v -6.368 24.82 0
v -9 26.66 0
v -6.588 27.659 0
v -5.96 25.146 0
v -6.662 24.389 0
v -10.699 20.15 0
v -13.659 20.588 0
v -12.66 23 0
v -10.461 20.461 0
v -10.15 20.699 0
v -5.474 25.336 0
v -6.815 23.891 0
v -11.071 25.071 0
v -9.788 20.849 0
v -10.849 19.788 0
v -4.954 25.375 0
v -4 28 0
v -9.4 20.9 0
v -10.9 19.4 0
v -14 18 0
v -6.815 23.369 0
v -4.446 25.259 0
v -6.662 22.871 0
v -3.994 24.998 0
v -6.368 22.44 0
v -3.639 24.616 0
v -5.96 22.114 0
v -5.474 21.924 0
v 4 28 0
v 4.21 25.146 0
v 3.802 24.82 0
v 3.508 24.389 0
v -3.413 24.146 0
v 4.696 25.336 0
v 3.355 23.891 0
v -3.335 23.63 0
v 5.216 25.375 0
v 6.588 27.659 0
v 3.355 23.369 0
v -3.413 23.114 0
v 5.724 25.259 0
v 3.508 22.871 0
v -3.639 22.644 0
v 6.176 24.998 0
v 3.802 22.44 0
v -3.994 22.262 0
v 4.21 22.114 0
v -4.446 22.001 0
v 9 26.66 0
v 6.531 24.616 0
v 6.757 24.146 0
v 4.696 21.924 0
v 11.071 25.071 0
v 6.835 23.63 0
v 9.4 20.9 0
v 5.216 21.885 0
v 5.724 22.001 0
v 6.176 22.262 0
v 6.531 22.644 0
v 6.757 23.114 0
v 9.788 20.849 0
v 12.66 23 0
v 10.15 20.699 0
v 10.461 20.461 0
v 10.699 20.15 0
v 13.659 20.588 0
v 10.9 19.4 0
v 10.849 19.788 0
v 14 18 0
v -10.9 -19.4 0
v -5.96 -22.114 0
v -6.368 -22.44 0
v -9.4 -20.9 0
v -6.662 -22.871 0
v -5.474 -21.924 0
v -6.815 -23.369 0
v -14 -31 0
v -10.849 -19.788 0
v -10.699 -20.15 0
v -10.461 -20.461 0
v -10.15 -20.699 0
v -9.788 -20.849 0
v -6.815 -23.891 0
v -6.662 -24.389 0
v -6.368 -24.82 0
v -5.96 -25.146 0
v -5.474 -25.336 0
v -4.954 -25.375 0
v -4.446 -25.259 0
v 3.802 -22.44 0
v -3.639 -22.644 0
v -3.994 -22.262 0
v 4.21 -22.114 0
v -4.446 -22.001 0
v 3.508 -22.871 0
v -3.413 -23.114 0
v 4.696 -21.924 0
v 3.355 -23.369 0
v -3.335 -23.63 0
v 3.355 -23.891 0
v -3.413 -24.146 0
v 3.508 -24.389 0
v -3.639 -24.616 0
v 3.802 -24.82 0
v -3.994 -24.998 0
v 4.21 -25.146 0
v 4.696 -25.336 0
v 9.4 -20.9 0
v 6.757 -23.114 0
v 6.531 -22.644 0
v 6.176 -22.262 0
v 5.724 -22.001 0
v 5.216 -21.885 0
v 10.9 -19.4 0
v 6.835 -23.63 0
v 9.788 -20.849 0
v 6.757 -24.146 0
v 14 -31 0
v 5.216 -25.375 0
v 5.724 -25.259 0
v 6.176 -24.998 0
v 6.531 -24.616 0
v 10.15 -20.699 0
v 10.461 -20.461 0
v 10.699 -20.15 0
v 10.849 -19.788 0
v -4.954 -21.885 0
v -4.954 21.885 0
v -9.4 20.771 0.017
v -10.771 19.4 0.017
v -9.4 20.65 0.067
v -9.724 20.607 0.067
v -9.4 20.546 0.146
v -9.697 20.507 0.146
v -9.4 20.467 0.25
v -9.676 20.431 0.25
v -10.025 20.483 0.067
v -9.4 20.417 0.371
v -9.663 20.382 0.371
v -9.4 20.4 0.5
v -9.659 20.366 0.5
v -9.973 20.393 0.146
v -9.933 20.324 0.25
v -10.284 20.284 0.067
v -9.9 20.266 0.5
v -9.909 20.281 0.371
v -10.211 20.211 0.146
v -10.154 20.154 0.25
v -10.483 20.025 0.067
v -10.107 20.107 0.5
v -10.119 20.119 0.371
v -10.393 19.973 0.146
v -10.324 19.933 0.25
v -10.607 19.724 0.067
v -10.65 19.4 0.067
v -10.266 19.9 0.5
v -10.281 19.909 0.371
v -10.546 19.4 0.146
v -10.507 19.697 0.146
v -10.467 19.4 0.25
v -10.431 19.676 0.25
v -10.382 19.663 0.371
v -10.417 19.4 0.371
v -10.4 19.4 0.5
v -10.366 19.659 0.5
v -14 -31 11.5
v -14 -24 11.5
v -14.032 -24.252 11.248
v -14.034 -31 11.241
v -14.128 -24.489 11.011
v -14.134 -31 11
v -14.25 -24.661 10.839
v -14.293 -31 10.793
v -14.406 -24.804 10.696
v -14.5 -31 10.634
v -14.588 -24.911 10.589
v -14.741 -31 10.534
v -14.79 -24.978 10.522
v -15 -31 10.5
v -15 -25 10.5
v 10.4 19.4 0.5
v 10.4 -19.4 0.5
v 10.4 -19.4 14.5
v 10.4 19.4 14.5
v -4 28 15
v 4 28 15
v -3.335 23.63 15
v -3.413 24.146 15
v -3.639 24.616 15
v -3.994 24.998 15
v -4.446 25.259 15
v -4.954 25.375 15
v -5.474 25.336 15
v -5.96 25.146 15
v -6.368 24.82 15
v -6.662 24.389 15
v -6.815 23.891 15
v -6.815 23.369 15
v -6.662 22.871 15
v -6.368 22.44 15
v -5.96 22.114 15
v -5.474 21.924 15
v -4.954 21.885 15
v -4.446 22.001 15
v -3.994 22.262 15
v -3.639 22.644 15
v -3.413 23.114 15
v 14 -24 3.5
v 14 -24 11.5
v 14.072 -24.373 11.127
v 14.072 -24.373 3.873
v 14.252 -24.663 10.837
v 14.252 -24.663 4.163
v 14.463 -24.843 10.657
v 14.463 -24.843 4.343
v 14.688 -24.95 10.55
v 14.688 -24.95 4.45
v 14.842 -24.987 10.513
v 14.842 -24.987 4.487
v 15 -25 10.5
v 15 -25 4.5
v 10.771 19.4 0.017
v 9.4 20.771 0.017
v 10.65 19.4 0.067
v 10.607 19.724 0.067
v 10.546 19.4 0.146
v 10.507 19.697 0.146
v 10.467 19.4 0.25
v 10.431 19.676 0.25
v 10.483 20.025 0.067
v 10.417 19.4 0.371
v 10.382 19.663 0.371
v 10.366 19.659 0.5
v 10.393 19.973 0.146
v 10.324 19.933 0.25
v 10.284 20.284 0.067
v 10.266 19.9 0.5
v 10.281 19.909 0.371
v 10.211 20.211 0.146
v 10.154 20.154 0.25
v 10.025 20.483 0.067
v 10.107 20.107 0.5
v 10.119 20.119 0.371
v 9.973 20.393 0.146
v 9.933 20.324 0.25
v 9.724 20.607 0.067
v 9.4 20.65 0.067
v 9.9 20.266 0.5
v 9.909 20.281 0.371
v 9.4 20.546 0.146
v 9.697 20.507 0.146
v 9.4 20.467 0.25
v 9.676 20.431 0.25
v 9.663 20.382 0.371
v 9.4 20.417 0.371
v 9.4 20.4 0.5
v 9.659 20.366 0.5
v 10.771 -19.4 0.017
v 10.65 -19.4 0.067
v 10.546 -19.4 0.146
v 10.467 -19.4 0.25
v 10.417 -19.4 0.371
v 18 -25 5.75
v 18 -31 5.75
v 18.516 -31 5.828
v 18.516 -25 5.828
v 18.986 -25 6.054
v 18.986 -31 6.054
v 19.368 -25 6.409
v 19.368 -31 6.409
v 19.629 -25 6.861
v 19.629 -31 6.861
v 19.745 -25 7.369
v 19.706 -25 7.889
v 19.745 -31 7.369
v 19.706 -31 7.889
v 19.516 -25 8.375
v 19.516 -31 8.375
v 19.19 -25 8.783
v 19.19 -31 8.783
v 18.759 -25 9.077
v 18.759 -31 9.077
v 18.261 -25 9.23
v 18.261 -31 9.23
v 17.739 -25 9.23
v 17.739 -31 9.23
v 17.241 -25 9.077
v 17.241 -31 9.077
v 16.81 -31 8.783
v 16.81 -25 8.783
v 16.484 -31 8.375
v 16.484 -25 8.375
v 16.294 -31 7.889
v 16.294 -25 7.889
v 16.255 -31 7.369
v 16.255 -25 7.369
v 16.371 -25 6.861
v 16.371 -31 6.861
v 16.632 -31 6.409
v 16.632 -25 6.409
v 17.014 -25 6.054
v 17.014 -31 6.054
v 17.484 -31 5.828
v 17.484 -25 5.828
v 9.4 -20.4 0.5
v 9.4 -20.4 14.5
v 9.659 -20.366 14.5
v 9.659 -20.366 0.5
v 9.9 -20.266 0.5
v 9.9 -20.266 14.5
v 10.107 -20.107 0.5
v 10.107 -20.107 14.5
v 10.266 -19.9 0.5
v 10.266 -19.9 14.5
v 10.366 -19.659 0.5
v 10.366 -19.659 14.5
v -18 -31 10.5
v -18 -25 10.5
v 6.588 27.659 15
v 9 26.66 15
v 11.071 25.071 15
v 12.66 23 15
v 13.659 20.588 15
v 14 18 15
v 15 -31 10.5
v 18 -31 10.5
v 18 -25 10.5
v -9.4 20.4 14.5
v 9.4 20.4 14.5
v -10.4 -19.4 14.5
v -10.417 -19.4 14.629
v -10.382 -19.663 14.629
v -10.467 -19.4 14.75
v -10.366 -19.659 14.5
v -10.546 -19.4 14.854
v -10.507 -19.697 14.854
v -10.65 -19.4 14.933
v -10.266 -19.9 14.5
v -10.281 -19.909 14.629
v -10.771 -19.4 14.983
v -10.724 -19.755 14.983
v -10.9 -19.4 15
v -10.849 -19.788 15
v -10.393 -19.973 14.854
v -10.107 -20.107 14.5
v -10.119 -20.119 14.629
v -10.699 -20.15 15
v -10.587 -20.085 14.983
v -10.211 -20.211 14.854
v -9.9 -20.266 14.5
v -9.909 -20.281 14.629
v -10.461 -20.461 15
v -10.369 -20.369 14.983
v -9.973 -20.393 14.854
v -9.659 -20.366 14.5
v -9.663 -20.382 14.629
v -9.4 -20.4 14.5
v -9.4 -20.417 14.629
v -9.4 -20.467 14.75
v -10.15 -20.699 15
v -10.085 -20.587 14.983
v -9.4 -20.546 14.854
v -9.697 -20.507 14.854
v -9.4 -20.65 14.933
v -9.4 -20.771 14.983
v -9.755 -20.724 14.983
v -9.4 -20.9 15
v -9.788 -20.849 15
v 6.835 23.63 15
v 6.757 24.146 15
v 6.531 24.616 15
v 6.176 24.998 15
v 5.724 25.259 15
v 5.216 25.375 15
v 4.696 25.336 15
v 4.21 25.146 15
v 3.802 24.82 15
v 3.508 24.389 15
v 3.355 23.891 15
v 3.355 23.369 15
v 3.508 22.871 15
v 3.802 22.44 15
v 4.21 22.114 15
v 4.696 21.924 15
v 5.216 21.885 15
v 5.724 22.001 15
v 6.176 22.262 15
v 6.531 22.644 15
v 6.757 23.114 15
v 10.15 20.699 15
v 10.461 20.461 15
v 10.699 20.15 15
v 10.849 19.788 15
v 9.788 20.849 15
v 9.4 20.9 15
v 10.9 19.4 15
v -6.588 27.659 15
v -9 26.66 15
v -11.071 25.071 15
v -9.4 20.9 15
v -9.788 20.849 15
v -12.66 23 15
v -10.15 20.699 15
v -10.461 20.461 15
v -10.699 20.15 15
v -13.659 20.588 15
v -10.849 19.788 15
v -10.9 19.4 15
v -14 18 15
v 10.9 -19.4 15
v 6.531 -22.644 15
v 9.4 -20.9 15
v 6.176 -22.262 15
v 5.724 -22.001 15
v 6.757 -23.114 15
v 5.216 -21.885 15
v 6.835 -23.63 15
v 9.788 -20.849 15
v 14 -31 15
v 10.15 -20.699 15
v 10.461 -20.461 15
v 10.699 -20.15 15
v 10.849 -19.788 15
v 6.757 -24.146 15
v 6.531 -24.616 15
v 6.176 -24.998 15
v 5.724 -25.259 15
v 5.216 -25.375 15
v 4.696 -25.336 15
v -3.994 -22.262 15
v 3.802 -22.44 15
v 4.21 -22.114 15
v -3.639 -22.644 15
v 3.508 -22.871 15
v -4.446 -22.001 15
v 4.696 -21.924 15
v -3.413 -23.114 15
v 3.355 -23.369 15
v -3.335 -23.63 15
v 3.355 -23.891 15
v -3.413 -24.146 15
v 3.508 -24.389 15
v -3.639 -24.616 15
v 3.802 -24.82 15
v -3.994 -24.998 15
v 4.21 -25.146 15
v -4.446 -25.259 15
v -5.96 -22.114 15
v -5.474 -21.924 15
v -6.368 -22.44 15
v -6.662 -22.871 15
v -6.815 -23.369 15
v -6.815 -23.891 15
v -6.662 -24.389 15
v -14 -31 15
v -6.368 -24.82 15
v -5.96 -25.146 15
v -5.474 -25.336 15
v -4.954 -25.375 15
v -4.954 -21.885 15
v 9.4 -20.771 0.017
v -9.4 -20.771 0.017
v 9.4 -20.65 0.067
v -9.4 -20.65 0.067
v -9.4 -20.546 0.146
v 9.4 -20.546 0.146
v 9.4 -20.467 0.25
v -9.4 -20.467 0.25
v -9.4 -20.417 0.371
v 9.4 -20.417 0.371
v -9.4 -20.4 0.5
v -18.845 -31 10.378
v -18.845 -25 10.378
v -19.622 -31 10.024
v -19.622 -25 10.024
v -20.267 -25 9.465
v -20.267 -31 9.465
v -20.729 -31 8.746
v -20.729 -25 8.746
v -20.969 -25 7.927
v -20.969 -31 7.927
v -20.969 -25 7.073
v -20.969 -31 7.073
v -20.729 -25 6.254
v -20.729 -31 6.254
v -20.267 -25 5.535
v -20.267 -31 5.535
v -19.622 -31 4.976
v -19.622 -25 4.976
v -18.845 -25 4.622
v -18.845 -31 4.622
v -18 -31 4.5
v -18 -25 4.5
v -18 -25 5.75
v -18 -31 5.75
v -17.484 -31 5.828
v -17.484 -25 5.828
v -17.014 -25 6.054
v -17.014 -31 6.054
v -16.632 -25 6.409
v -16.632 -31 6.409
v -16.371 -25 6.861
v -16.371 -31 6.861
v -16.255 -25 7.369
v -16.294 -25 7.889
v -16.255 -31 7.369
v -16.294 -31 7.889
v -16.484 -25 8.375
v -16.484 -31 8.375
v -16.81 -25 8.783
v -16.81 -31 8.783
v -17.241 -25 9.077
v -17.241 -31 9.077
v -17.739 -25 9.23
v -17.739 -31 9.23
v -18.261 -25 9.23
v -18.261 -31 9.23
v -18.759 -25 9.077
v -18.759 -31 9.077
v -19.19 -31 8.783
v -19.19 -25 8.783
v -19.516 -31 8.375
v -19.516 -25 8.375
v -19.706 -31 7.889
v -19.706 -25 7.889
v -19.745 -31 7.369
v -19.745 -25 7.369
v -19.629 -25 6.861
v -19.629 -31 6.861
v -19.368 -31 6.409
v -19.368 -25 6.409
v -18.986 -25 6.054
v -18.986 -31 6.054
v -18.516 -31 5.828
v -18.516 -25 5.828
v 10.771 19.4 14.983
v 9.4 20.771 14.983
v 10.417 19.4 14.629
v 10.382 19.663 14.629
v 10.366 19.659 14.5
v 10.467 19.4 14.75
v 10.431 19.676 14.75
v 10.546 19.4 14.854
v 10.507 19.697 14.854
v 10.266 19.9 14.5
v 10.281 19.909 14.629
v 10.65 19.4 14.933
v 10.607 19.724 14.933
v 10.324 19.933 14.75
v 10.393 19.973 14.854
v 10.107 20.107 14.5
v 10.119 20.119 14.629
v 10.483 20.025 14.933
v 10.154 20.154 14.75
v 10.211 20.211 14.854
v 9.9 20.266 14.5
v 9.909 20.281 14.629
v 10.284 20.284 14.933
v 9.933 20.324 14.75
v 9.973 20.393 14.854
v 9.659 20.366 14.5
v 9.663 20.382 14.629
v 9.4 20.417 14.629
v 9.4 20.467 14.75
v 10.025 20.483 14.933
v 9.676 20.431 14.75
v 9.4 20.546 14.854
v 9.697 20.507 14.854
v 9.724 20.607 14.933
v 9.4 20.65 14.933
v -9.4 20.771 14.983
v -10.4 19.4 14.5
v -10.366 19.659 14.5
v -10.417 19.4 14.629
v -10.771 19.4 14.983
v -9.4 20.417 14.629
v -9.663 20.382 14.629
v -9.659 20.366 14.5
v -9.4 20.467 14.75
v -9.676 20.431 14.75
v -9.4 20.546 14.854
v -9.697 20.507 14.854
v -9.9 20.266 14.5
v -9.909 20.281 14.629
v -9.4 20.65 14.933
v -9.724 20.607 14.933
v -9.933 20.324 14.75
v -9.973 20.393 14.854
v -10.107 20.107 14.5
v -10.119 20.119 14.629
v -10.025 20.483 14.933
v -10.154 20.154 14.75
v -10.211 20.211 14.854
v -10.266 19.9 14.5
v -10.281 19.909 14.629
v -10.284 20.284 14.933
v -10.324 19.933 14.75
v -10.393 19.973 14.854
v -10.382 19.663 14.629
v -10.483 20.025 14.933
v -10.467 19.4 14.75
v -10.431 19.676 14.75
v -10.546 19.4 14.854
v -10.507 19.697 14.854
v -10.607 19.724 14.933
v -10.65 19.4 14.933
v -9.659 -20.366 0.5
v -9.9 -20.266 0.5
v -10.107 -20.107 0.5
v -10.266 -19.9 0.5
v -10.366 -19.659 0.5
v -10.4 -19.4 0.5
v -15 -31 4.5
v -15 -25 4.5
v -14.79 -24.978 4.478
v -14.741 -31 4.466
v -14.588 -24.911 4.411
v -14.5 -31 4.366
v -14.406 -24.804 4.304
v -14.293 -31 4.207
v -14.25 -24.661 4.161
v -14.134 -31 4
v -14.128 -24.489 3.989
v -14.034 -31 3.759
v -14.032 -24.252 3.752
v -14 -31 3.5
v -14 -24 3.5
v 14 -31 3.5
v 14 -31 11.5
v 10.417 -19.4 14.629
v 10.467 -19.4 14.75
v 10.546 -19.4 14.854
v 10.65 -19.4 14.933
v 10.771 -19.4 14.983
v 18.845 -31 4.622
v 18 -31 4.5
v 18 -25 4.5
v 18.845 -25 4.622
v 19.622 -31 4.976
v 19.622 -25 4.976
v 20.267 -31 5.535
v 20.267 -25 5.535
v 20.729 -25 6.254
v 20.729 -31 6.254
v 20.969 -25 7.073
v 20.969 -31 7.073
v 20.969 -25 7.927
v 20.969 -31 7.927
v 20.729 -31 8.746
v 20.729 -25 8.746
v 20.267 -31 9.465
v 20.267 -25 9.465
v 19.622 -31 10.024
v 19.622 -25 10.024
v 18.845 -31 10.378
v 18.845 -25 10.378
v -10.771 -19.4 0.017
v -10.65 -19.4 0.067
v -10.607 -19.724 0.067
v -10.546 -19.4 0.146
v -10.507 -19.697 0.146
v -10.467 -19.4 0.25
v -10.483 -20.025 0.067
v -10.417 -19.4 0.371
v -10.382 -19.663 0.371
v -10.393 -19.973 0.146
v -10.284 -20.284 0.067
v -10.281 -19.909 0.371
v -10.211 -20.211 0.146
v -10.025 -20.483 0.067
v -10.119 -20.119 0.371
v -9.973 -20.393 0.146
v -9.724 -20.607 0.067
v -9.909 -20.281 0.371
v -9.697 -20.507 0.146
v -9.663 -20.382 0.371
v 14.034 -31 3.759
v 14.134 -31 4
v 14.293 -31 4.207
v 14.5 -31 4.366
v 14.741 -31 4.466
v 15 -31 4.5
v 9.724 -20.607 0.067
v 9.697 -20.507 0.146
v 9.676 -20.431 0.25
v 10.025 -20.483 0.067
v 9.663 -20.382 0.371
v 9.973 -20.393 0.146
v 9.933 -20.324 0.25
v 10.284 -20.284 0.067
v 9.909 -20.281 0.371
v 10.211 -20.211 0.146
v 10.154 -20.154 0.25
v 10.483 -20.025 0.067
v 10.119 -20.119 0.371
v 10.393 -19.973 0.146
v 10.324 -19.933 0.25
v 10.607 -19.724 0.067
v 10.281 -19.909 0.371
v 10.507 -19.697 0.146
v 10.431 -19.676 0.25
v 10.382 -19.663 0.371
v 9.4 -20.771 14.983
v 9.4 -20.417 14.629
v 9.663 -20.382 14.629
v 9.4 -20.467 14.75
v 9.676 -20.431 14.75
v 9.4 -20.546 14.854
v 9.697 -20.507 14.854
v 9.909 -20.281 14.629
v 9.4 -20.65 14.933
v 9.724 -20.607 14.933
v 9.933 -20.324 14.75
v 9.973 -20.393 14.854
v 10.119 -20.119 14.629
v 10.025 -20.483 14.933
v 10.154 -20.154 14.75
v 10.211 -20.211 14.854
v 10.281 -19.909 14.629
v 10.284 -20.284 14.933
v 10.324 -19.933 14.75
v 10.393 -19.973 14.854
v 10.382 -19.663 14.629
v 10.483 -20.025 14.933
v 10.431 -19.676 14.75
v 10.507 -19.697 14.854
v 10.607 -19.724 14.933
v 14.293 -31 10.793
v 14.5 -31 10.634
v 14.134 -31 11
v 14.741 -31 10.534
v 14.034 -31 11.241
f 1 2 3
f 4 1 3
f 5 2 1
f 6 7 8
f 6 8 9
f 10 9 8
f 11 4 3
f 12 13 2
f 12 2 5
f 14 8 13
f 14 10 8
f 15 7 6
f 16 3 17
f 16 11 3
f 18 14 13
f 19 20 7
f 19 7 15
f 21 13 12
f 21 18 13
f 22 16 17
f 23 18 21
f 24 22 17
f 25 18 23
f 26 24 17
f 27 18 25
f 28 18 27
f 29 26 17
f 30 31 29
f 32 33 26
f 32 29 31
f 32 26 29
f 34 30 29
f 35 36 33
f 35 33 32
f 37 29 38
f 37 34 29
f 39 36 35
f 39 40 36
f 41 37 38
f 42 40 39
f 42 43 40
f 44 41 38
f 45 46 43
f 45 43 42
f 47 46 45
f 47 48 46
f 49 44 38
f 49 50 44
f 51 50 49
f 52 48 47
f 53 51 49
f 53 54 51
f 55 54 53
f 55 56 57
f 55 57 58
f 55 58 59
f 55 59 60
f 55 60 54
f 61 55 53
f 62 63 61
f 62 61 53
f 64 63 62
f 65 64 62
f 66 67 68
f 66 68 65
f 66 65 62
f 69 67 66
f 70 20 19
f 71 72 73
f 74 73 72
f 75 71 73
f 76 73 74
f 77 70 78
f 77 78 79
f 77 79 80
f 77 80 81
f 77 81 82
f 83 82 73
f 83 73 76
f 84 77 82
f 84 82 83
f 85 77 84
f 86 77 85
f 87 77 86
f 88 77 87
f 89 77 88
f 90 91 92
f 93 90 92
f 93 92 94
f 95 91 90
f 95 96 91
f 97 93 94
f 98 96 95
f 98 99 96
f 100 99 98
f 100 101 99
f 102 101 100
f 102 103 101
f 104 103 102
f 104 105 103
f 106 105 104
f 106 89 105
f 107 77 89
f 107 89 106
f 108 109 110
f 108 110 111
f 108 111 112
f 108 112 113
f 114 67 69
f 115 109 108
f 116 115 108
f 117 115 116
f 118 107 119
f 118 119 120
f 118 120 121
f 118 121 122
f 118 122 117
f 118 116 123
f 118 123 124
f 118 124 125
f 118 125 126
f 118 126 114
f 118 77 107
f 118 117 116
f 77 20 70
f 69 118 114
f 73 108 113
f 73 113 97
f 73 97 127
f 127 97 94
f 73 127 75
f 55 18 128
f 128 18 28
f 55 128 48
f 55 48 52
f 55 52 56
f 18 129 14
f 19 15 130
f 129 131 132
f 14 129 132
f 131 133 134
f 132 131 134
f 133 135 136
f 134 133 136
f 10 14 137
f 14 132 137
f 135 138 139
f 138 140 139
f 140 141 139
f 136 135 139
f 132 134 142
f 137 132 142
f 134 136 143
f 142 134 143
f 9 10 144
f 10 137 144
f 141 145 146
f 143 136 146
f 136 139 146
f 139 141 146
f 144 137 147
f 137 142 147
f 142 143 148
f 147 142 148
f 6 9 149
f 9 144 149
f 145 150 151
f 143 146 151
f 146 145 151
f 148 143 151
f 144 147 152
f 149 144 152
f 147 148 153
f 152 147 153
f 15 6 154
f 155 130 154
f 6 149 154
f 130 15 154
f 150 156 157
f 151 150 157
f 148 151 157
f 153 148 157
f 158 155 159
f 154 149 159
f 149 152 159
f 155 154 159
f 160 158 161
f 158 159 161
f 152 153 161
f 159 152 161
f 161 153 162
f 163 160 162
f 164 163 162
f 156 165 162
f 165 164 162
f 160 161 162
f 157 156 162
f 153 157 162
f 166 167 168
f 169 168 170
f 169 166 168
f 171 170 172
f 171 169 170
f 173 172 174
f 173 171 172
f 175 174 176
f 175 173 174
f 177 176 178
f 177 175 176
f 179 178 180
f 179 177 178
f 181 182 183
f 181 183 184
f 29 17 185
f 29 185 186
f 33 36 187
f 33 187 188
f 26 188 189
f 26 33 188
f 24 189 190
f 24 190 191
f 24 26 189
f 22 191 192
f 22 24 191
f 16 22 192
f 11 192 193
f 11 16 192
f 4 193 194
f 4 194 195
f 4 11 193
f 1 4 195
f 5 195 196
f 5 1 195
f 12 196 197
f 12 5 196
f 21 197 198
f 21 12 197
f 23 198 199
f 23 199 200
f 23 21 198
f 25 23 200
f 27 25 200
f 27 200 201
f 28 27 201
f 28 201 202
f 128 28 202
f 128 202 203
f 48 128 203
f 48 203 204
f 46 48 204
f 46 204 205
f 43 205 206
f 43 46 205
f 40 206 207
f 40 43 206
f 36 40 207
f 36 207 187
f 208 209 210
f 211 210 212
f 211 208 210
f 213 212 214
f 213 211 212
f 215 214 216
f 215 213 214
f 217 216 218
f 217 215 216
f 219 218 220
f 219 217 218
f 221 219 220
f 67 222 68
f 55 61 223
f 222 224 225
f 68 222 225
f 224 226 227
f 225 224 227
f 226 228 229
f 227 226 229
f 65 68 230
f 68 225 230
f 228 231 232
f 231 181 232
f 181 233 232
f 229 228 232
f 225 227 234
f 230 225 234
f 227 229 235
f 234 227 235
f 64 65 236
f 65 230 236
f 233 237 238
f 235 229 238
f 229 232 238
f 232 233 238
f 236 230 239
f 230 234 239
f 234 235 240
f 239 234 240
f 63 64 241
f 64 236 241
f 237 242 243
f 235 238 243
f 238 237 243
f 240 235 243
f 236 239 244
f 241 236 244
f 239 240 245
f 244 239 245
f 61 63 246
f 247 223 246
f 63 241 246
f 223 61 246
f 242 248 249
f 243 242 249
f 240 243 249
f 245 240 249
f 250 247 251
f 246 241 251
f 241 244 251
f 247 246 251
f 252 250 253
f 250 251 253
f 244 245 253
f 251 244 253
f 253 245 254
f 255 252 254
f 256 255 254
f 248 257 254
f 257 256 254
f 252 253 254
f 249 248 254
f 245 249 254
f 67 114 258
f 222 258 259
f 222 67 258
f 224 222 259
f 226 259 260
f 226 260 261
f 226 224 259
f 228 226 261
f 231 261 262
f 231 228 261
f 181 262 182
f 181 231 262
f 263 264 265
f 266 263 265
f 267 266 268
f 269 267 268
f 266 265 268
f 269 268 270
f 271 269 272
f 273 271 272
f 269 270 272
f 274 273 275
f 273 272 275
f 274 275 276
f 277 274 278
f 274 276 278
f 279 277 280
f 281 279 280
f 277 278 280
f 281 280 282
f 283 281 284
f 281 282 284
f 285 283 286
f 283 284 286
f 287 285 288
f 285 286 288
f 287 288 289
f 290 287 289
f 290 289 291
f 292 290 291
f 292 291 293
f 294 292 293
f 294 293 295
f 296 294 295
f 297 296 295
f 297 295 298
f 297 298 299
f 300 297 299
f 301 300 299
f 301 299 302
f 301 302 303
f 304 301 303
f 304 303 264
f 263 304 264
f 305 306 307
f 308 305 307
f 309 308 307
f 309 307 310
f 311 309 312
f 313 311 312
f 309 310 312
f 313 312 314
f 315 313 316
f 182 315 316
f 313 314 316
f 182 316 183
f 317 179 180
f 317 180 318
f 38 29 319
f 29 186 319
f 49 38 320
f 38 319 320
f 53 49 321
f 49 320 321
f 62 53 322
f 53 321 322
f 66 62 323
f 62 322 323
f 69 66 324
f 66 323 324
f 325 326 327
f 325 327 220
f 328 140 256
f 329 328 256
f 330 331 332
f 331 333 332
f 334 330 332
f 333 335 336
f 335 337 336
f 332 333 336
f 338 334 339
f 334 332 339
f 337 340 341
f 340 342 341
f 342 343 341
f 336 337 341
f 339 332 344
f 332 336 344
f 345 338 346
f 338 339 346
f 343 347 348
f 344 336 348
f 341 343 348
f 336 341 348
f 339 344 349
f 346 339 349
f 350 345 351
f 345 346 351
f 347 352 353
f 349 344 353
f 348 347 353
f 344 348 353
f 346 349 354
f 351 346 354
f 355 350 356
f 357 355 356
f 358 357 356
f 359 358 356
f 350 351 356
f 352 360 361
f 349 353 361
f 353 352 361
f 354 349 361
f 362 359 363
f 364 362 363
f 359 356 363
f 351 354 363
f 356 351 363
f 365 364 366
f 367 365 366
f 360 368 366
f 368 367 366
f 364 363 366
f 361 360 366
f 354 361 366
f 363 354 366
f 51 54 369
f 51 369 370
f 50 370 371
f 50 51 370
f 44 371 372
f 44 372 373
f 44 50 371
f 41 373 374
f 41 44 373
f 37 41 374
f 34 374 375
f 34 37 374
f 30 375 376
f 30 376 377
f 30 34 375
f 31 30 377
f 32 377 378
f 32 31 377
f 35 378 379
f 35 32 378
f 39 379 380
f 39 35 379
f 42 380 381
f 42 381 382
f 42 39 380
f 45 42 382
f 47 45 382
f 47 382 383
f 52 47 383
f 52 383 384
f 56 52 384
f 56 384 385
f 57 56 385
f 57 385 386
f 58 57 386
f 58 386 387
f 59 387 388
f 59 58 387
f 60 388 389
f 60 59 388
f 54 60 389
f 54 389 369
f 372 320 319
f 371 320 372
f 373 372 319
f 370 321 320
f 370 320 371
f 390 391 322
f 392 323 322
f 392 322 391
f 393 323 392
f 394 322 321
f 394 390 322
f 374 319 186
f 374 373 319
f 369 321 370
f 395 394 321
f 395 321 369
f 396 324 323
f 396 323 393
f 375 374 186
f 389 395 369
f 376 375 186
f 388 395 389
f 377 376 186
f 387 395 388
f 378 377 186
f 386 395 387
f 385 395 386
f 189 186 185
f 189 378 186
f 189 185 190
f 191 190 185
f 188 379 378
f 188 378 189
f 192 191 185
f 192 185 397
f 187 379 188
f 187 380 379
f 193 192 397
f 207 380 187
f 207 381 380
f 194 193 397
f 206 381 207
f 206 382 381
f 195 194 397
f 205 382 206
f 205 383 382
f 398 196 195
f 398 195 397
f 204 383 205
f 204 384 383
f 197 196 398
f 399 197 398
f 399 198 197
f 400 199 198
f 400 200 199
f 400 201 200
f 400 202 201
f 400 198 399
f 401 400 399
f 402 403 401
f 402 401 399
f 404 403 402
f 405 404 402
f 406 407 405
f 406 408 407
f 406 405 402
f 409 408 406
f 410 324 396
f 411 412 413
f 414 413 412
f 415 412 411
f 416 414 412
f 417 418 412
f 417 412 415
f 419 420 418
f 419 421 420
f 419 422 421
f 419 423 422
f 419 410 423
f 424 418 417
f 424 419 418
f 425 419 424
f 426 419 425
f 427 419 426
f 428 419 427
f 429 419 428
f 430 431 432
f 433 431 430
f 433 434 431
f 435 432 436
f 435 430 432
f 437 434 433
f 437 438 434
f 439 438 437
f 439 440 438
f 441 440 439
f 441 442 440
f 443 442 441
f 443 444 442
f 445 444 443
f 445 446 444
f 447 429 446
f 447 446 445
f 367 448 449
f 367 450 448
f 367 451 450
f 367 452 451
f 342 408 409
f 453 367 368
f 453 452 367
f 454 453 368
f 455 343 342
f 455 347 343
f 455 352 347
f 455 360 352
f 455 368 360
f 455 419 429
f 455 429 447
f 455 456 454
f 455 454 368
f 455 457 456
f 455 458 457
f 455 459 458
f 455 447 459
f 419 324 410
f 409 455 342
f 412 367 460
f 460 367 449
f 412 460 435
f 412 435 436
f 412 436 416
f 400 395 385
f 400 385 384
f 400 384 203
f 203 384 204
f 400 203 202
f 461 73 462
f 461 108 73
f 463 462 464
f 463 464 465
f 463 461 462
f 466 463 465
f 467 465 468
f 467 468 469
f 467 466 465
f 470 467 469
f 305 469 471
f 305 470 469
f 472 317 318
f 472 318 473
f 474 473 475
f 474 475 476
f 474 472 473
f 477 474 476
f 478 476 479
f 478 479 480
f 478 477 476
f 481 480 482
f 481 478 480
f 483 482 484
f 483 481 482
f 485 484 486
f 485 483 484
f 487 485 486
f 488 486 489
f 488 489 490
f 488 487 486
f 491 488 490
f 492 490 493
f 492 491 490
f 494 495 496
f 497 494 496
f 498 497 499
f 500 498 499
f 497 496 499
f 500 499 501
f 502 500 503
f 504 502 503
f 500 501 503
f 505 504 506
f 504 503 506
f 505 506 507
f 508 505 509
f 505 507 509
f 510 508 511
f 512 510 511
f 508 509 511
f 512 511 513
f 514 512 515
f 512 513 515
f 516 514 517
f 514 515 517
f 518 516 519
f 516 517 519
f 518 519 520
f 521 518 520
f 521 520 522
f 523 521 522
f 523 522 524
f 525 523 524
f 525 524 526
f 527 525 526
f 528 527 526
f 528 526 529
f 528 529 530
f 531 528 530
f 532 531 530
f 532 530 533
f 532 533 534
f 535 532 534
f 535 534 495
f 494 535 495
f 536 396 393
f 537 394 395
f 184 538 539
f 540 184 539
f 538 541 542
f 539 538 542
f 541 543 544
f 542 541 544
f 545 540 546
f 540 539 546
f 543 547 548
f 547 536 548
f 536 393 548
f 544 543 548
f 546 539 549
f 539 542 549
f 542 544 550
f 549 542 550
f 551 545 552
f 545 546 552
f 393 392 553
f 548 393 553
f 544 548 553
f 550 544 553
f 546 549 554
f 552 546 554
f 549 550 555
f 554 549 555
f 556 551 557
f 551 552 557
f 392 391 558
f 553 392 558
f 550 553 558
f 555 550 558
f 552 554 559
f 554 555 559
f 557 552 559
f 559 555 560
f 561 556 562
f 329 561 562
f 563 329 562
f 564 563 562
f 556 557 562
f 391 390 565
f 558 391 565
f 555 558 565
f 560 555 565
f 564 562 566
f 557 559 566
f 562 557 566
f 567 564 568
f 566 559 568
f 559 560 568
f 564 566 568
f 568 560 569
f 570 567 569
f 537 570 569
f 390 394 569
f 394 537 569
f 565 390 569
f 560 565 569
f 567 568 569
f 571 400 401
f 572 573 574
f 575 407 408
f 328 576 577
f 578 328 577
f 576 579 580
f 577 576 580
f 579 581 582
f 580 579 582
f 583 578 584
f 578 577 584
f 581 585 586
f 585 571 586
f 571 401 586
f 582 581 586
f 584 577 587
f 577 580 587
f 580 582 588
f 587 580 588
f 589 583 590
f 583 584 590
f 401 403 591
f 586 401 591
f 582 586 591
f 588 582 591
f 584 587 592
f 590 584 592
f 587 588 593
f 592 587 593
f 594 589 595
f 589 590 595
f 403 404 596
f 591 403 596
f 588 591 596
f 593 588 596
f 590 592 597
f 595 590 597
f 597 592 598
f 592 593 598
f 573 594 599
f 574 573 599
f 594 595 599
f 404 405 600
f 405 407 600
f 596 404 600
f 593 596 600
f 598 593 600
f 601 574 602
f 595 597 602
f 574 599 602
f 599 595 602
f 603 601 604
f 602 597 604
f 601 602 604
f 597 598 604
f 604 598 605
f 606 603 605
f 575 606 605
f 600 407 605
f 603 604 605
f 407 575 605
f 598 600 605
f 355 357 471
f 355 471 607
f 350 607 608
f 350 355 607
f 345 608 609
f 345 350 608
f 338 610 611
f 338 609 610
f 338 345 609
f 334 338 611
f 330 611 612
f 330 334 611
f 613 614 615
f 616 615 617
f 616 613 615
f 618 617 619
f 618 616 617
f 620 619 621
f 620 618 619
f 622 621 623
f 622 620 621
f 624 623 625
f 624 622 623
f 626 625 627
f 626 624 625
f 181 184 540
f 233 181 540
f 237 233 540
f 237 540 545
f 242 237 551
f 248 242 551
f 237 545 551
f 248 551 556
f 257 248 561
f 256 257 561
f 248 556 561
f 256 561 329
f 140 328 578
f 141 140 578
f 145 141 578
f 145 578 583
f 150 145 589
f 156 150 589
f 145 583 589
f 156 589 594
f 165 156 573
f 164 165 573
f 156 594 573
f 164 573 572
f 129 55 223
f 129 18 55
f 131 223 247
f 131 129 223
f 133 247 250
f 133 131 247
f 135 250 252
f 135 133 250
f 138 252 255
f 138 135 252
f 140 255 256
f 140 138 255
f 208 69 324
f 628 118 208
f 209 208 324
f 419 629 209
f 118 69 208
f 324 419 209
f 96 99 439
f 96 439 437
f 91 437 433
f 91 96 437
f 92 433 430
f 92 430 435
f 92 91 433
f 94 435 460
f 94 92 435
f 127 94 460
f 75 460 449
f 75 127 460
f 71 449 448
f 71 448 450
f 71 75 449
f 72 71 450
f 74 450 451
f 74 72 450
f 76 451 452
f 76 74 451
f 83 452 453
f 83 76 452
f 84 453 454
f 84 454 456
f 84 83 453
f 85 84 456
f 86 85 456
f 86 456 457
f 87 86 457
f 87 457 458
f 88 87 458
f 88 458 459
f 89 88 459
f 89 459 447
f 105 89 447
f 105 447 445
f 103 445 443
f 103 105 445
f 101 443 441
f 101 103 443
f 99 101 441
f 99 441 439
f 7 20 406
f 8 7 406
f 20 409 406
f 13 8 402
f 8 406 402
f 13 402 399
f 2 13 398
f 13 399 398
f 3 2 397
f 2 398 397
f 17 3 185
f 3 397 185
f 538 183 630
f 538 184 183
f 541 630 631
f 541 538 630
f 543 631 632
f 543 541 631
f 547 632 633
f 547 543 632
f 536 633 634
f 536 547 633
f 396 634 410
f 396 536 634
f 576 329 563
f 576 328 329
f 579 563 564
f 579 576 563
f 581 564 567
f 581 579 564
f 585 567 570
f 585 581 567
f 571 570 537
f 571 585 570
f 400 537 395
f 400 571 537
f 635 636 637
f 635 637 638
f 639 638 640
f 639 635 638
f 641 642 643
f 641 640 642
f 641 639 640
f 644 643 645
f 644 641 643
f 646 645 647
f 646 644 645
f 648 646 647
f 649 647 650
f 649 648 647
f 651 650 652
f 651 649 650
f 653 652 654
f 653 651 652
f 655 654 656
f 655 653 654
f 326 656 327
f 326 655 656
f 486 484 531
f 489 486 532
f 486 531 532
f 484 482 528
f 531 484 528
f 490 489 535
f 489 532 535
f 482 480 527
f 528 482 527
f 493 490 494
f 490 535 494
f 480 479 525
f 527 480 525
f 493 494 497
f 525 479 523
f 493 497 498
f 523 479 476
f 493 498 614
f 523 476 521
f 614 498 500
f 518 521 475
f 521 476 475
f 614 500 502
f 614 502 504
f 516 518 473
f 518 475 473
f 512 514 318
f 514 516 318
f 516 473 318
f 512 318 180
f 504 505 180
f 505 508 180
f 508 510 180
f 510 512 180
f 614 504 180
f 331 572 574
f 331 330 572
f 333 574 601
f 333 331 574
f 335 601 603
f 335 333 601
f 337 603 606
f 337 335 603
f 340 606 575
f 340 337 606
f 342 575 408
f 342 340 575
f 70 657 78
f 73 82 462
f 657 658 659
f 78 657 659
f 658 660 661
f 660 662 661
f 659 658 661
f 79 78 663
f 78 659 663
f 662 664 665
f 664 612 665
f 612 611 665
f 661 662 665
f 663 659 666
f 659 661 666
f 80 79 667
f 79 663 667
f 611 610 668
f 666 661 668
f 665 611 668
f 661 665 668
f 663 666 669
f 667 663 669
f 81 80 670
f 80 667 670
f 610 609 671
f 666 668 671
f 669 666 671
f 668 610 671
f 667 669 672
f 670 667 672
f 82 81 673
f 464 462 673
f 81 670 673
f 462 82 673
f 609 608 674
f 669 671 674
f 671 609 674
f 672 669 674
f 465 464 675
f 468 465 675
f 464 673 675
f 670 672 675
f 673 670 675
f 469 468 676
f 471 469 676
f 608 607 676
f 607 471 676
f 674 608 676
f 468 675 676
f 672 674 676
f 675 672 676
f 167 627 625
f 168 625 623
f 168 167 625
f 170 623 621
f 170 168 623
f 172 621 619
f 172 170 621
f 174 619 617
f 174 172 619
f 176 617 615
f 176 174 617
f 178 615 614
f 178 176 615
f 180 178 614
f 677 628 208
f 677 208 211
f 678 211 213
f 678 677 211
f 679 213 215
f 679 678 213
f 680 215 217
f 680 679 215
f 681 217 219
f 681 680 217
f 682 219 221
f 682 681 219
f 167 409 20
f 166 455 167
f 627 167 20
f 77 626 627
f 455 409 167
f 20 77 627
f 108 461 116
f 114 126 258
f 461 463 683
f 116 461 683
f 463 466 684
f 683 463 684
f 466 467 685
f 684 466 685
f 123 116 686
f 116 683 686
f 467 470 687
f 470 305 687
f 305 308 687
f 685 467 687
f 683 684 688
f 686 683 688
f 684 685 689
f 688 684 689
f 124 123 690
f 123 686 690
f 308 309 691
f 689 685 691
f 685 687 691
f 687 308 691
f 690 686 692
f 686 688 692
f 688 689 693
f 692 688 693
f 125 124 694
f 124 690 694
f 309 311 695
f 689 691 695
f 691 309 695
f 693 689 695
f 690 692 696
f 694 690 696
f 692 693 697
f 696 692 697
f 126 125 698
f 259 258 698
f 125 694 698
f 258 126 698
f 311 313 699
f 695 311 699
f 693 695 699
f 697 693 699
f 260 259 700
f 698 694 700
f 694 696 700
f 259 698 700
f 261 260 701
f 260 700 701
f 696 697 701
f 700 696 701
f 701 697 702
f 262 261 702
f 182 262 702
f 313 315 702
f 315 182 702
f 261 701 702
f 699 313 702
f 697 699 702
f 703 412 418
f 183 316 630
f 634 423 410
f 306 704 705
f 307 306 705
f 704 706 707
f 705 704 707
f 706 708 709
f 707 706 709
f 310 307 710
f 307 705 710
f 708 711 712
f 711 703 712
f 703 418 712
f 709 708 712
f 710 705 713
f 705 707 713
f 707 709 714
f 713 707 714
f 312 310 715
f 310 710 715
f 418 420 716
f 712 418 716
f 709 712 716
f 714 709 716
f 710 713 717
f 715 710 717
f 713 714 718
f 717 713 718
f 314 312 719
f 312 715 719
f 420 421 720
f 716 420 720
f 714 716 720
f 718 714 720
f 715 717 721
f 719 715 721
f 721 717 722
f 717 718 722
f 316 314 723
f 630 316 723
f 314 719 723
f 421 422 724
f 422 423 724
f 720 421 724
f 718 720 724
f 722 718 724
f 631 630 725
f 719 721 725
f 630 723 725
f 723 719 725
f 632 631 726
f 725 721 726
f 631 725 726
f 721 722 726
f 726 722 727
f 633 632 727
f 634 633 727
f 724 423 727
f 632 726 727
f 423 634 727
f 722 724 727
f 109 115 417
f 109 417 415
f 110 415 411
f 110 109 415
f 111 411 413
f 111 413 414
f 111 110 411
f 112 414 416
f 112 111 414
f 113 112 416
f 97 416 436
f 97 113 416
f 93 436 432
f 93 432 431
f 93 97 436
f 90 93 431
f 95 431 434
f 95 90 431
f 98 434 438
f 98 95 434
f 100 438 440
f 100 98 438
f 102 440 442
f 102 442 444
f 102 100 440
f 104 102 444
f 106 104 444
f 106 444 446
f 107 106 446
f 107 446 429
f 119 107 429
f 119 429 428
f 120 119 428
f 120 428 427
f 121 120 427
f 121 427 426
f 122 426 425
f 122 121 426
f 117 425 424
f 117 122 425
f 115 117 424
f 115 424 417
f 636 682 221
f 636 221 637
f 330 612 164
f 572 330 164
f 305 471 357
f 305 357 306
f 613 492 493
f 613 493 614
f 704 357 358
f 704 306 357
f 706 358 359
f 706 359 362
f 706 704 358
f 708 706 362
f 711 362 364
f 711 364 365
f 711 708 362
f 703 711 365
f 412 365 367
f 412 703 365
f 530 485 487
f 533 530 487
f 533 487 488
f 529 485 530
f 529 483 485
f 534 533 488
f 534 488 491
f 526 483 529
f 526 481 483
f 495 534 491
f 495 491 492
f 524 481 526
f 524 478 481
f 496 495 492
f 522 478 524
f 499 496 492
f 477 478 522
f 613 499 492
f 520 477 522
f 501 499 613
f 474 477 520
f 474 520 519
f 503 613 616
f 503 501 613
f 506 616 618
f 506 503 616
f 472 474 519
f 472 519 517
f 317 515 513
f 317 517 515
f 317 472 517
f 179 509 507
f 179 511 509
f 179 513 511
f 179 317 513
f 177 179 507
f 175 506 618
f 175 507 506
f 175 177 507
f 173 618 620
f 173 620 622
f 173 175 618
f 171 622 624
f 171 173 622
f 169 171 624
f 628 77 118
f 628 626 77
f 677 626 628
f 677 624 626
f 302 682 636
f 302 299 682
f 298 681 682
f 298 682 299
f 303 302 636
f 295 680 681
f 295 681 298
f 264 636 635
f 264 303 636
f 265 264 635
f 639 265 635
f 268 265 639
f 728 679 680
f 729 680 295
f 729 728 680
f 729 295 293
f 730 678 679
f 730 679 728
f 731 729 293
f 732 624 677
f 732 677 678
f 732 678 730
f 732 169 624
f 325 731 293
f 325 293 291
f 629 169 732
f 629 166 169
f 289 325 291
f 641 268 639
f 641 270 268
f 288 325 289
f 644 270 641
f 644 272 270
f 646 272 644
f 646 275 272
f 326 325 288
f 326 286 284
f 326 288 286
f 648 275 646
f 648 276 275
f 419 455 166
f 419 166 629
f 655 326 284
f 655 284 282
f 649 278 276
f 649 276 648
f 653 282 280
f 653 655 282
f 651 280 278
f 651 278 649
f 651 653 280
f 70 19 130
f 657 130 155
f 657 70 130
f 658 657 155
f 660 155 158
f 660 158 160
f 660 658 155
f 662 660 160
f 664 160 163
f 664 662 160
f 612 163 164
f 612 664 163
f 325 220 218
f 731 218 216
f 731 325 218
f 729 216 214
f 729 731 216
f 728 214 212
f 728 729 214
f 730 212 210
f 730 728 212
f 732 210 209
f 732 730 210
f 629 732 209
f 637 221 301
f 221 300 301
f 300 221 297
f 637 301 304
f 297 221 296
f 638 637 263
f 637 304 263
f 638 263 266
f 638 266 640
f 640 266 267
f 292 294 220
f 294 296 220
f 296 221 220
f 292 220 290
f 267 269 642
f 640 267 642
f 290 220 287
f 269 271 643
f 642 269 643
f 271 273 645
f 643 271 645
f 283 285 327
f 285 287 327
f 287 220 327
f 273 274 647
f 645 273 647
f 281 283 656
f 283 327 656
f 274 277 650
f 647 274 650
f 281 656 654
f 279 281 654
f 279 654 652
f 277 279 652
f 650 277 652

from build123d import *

# Parameters (mm, degrees)
SKETCH1_W           = 28
SKETCH1_H           = 56
SKETCH1_R           = 1.75
SKETCH1_W_2         = 20.8
SKETCH1_H_2         = 40.8
BOSS_EXTRUDE1_DEPTH = 15
FILLET1_R           = 10
FILLET2_R           = 1
FILLET3_R           = 0.5
SKETCH2_R           = 3
SKETCH2_R_2         = 1.75
BOSS_EXTRUDE2_DEPTH = 3
FILLET4_R           = 1
FILLET5_R           = 1
BOSS_EXTRUDE3_START = 3
SKETCH3_R           = 1.75
BOSS_EXTRUDE3_DEPTH = 3


with BuildPart() as part:
    # Sketch1 → Boss-Extrude1 (new body)
    with BuildSketch(Plane.XY):
        Rectangle(SKETCH1_W, SKETCH1_H)
        with Locations((-5.085, 23.63)):
            Circle(SKETCH1_R, mode=Mode.SUBTRACT)
        with Locations((5.085, 23.63)):
            Circle(SKETCH1_R, mode=Mode.SUBTRACT)
        with Locations((-5.085, -23.63)):
            Circle(SKETCH1_R, mode=Mode.SUBTRACT)
        with Locations((5.085, -23.63)):
            Circle(SKETCH1_R, mode=Mode.SUBTRACT)
        Rectangle(SKETCH1_W_2, SKETCH1_H_2, mode=Mode.SUBTRACT)
    extrude(amount=BOSS_EXTRUDE1_DEPTH)

    # Fillet1
    fillet1_edges = [part.edges().sort_by_distance(p)[0] for p in [
        (-14, 28, 7.5),
        (14, 28, 7.5),
    ]]
    fillet(fillet1_edges, radius=FILLET1_R)

    # Fillet2
    fillet2_edges = [part.edges().sort_by_distance(p)[0] for p in [
        (10.4, -20.4, 7.5),
        (10.4, 20.4, 7.5),
        (-10.4, 20.4, 7.5),
        (-10.4, -20.4, 7.5),
    ]]
    fillet(fillet2_edges, radius=FILLET2_R)

    # Fillet3
    fillet3_edges = [part.edges().sort_by_distance(p)[0] for p in [
        (0, -20.4, 0),
        (0, -20.4, 15),
        (10.4, 0, 0),
        (10.4, 0, 15),
        (-10.4, 0, 0),
        (-10.4, 0, 15),
        (0, 20.4, 0),
        (0, 20.4, 15),
        (10.107106781, -20.107106781, 0),
        (10.107106781, -20.107106781, 15),
        (-10.107106781, -20.107106781, 0),
        (-10.107106781, -20.107106781, 15),
        (-10.107106781, 20.107106781, 0),
        (-10.107106781, 20.107106781, 15),
        (10.107106781, 20.107106781, 0),
        (10.107106781, 20.107106781, 15),
    ]]
    fillet(fillet3_edges, radius=FILLET3_R)

    # Sketch2 → Boss-Extrude2 (add)
    # profile 1 of 4: a face of its own
    with BuildSketch(Plane.XZ.offset(28)):
        with Locations((-18, 7.5)):
            Circle(SKETCH2_R)
        with Locations(Location((-18, 7.5, 0), (0, 0, 270))):
            Circle(SKETCH2_R_2, mode=Mode.SUBTRACT)
    # profile 2 of 4: a face of its own
    with BuildSketch(Plane.XZ.offset(28)):
        with BuildLine():
            Line((-18, 4.5), (-14, 4.5))
            Line((-14, 4.5), (-14, 10.5))
            Line((-14, 10.5), (-18, 10.5))
            ThreePointArc((-18, 10.5), (-15.878679656, 9.621320344), (-15, 7.5))
            ThreePointArc((-15, 7.5), (-15.878679656, 5.378679656), (-18, 4.5))
        make_face()
    # profile 3 of 4: a face of its own
    with BuildSketch(Plane.XZ.offset(28)):
        with BuildLine():
            Line((14, 4.5), (18, 4.5))
            ThreePointArc((18, 4.5), (15, 7.5), (18, 10.5))
            Line((18, 10.5), (14, 10.5))
            Line((14, 10.5), (14, 4.5))
        make_face()
    # profile 4 of 4: a face of its own
    with BuildSketch(Plane.XZ.offset(28)):
        with Locations((18, 7.5)):
            Circle(SKETCH2_R)
        with Locations(Location((18, 7.5, 0), (0, 0, 270))):
            Circle(SKETCH2_R_2, mode=Mode.SUBTRACT)
    extrude(amount=-BOSS_EXTRUDE2_DEPTH)

    # Fillet4
    fillet4_edges = [part.edges().sort_by_distance(p)[0] for p in [
        (-14, -25, 7.5),
        (14, -25, 7.5),
    ]]
    fillet(fillet4_edges, radius=FILLET4_R)

    # Fillet5
    fillet5_edges = [part.edges().sort_by_distance(p)[0] for p in [
        (14, -26, 10.5),
        (14, -26, 4.5),
        (-14, -26, 4.5),
        (-14, -26, 10.5),
    ]]
    fillet(fillet5_edges, radius=FILLET5_R)

    # Sketch3 → Boss-Extrude3 (add)
    with BuildSketch(Plane.XZ.offset(28).offset(BOSS_EXTRUDE3_START)):
        with BuildLine():
            Line((-14, 0), (14, 0))
            Line((14, 0), (14, 3.5))
            ThreePointArc((14, 3.5), (14.292893219, 4.207106781), (15, 4.5))
            Line((15, 4.5), (18, 4.5))
            ThreePointArc((18, 4.5), (21, 7.5), (18, 10.5))
            Line((18, 10.5), (15, 10.5))
            ThreePointArc((15, 10.5), (14.292893219, 10.792893219), (14, 11.5))
            Line((14, 11.5), (14, 15))
            Line((14, 15), (-14, 15))
            Line((-14, 15), (-14, 11.5))
            ThreePointArc((-14, 11.5), (-14.292893219, 10.792893219), (-15, 10.5))
            Line((-15, 10.5), (-18, 10.5))
            ThreePointArc((-18, 10.5), (-21, 7.5), (-18, 4.5))
            Line((-18, 4.5), (-15, 4.5))
            ThreePointArc((-15, 4.5), (-14.292893219, 4.207106781), (-14, 3.5))
            Line((-14, 3.5), (-14, 0))
        make_face()
        with Locations(Location((18, 7.5, 0), (0, 0, 270))):
            Circle(SKETCH3_R, mode=Mode.SUBTRACT)
        with Locations(Location((-18, 7.5, 0), (0, 0, 270))):
            Circle(SKETCH3_R, mode=Mode.SUBTRACT)
    extrude(amount=-BOSS_EXTRUDE3_DEPTH)


solid = part.part
